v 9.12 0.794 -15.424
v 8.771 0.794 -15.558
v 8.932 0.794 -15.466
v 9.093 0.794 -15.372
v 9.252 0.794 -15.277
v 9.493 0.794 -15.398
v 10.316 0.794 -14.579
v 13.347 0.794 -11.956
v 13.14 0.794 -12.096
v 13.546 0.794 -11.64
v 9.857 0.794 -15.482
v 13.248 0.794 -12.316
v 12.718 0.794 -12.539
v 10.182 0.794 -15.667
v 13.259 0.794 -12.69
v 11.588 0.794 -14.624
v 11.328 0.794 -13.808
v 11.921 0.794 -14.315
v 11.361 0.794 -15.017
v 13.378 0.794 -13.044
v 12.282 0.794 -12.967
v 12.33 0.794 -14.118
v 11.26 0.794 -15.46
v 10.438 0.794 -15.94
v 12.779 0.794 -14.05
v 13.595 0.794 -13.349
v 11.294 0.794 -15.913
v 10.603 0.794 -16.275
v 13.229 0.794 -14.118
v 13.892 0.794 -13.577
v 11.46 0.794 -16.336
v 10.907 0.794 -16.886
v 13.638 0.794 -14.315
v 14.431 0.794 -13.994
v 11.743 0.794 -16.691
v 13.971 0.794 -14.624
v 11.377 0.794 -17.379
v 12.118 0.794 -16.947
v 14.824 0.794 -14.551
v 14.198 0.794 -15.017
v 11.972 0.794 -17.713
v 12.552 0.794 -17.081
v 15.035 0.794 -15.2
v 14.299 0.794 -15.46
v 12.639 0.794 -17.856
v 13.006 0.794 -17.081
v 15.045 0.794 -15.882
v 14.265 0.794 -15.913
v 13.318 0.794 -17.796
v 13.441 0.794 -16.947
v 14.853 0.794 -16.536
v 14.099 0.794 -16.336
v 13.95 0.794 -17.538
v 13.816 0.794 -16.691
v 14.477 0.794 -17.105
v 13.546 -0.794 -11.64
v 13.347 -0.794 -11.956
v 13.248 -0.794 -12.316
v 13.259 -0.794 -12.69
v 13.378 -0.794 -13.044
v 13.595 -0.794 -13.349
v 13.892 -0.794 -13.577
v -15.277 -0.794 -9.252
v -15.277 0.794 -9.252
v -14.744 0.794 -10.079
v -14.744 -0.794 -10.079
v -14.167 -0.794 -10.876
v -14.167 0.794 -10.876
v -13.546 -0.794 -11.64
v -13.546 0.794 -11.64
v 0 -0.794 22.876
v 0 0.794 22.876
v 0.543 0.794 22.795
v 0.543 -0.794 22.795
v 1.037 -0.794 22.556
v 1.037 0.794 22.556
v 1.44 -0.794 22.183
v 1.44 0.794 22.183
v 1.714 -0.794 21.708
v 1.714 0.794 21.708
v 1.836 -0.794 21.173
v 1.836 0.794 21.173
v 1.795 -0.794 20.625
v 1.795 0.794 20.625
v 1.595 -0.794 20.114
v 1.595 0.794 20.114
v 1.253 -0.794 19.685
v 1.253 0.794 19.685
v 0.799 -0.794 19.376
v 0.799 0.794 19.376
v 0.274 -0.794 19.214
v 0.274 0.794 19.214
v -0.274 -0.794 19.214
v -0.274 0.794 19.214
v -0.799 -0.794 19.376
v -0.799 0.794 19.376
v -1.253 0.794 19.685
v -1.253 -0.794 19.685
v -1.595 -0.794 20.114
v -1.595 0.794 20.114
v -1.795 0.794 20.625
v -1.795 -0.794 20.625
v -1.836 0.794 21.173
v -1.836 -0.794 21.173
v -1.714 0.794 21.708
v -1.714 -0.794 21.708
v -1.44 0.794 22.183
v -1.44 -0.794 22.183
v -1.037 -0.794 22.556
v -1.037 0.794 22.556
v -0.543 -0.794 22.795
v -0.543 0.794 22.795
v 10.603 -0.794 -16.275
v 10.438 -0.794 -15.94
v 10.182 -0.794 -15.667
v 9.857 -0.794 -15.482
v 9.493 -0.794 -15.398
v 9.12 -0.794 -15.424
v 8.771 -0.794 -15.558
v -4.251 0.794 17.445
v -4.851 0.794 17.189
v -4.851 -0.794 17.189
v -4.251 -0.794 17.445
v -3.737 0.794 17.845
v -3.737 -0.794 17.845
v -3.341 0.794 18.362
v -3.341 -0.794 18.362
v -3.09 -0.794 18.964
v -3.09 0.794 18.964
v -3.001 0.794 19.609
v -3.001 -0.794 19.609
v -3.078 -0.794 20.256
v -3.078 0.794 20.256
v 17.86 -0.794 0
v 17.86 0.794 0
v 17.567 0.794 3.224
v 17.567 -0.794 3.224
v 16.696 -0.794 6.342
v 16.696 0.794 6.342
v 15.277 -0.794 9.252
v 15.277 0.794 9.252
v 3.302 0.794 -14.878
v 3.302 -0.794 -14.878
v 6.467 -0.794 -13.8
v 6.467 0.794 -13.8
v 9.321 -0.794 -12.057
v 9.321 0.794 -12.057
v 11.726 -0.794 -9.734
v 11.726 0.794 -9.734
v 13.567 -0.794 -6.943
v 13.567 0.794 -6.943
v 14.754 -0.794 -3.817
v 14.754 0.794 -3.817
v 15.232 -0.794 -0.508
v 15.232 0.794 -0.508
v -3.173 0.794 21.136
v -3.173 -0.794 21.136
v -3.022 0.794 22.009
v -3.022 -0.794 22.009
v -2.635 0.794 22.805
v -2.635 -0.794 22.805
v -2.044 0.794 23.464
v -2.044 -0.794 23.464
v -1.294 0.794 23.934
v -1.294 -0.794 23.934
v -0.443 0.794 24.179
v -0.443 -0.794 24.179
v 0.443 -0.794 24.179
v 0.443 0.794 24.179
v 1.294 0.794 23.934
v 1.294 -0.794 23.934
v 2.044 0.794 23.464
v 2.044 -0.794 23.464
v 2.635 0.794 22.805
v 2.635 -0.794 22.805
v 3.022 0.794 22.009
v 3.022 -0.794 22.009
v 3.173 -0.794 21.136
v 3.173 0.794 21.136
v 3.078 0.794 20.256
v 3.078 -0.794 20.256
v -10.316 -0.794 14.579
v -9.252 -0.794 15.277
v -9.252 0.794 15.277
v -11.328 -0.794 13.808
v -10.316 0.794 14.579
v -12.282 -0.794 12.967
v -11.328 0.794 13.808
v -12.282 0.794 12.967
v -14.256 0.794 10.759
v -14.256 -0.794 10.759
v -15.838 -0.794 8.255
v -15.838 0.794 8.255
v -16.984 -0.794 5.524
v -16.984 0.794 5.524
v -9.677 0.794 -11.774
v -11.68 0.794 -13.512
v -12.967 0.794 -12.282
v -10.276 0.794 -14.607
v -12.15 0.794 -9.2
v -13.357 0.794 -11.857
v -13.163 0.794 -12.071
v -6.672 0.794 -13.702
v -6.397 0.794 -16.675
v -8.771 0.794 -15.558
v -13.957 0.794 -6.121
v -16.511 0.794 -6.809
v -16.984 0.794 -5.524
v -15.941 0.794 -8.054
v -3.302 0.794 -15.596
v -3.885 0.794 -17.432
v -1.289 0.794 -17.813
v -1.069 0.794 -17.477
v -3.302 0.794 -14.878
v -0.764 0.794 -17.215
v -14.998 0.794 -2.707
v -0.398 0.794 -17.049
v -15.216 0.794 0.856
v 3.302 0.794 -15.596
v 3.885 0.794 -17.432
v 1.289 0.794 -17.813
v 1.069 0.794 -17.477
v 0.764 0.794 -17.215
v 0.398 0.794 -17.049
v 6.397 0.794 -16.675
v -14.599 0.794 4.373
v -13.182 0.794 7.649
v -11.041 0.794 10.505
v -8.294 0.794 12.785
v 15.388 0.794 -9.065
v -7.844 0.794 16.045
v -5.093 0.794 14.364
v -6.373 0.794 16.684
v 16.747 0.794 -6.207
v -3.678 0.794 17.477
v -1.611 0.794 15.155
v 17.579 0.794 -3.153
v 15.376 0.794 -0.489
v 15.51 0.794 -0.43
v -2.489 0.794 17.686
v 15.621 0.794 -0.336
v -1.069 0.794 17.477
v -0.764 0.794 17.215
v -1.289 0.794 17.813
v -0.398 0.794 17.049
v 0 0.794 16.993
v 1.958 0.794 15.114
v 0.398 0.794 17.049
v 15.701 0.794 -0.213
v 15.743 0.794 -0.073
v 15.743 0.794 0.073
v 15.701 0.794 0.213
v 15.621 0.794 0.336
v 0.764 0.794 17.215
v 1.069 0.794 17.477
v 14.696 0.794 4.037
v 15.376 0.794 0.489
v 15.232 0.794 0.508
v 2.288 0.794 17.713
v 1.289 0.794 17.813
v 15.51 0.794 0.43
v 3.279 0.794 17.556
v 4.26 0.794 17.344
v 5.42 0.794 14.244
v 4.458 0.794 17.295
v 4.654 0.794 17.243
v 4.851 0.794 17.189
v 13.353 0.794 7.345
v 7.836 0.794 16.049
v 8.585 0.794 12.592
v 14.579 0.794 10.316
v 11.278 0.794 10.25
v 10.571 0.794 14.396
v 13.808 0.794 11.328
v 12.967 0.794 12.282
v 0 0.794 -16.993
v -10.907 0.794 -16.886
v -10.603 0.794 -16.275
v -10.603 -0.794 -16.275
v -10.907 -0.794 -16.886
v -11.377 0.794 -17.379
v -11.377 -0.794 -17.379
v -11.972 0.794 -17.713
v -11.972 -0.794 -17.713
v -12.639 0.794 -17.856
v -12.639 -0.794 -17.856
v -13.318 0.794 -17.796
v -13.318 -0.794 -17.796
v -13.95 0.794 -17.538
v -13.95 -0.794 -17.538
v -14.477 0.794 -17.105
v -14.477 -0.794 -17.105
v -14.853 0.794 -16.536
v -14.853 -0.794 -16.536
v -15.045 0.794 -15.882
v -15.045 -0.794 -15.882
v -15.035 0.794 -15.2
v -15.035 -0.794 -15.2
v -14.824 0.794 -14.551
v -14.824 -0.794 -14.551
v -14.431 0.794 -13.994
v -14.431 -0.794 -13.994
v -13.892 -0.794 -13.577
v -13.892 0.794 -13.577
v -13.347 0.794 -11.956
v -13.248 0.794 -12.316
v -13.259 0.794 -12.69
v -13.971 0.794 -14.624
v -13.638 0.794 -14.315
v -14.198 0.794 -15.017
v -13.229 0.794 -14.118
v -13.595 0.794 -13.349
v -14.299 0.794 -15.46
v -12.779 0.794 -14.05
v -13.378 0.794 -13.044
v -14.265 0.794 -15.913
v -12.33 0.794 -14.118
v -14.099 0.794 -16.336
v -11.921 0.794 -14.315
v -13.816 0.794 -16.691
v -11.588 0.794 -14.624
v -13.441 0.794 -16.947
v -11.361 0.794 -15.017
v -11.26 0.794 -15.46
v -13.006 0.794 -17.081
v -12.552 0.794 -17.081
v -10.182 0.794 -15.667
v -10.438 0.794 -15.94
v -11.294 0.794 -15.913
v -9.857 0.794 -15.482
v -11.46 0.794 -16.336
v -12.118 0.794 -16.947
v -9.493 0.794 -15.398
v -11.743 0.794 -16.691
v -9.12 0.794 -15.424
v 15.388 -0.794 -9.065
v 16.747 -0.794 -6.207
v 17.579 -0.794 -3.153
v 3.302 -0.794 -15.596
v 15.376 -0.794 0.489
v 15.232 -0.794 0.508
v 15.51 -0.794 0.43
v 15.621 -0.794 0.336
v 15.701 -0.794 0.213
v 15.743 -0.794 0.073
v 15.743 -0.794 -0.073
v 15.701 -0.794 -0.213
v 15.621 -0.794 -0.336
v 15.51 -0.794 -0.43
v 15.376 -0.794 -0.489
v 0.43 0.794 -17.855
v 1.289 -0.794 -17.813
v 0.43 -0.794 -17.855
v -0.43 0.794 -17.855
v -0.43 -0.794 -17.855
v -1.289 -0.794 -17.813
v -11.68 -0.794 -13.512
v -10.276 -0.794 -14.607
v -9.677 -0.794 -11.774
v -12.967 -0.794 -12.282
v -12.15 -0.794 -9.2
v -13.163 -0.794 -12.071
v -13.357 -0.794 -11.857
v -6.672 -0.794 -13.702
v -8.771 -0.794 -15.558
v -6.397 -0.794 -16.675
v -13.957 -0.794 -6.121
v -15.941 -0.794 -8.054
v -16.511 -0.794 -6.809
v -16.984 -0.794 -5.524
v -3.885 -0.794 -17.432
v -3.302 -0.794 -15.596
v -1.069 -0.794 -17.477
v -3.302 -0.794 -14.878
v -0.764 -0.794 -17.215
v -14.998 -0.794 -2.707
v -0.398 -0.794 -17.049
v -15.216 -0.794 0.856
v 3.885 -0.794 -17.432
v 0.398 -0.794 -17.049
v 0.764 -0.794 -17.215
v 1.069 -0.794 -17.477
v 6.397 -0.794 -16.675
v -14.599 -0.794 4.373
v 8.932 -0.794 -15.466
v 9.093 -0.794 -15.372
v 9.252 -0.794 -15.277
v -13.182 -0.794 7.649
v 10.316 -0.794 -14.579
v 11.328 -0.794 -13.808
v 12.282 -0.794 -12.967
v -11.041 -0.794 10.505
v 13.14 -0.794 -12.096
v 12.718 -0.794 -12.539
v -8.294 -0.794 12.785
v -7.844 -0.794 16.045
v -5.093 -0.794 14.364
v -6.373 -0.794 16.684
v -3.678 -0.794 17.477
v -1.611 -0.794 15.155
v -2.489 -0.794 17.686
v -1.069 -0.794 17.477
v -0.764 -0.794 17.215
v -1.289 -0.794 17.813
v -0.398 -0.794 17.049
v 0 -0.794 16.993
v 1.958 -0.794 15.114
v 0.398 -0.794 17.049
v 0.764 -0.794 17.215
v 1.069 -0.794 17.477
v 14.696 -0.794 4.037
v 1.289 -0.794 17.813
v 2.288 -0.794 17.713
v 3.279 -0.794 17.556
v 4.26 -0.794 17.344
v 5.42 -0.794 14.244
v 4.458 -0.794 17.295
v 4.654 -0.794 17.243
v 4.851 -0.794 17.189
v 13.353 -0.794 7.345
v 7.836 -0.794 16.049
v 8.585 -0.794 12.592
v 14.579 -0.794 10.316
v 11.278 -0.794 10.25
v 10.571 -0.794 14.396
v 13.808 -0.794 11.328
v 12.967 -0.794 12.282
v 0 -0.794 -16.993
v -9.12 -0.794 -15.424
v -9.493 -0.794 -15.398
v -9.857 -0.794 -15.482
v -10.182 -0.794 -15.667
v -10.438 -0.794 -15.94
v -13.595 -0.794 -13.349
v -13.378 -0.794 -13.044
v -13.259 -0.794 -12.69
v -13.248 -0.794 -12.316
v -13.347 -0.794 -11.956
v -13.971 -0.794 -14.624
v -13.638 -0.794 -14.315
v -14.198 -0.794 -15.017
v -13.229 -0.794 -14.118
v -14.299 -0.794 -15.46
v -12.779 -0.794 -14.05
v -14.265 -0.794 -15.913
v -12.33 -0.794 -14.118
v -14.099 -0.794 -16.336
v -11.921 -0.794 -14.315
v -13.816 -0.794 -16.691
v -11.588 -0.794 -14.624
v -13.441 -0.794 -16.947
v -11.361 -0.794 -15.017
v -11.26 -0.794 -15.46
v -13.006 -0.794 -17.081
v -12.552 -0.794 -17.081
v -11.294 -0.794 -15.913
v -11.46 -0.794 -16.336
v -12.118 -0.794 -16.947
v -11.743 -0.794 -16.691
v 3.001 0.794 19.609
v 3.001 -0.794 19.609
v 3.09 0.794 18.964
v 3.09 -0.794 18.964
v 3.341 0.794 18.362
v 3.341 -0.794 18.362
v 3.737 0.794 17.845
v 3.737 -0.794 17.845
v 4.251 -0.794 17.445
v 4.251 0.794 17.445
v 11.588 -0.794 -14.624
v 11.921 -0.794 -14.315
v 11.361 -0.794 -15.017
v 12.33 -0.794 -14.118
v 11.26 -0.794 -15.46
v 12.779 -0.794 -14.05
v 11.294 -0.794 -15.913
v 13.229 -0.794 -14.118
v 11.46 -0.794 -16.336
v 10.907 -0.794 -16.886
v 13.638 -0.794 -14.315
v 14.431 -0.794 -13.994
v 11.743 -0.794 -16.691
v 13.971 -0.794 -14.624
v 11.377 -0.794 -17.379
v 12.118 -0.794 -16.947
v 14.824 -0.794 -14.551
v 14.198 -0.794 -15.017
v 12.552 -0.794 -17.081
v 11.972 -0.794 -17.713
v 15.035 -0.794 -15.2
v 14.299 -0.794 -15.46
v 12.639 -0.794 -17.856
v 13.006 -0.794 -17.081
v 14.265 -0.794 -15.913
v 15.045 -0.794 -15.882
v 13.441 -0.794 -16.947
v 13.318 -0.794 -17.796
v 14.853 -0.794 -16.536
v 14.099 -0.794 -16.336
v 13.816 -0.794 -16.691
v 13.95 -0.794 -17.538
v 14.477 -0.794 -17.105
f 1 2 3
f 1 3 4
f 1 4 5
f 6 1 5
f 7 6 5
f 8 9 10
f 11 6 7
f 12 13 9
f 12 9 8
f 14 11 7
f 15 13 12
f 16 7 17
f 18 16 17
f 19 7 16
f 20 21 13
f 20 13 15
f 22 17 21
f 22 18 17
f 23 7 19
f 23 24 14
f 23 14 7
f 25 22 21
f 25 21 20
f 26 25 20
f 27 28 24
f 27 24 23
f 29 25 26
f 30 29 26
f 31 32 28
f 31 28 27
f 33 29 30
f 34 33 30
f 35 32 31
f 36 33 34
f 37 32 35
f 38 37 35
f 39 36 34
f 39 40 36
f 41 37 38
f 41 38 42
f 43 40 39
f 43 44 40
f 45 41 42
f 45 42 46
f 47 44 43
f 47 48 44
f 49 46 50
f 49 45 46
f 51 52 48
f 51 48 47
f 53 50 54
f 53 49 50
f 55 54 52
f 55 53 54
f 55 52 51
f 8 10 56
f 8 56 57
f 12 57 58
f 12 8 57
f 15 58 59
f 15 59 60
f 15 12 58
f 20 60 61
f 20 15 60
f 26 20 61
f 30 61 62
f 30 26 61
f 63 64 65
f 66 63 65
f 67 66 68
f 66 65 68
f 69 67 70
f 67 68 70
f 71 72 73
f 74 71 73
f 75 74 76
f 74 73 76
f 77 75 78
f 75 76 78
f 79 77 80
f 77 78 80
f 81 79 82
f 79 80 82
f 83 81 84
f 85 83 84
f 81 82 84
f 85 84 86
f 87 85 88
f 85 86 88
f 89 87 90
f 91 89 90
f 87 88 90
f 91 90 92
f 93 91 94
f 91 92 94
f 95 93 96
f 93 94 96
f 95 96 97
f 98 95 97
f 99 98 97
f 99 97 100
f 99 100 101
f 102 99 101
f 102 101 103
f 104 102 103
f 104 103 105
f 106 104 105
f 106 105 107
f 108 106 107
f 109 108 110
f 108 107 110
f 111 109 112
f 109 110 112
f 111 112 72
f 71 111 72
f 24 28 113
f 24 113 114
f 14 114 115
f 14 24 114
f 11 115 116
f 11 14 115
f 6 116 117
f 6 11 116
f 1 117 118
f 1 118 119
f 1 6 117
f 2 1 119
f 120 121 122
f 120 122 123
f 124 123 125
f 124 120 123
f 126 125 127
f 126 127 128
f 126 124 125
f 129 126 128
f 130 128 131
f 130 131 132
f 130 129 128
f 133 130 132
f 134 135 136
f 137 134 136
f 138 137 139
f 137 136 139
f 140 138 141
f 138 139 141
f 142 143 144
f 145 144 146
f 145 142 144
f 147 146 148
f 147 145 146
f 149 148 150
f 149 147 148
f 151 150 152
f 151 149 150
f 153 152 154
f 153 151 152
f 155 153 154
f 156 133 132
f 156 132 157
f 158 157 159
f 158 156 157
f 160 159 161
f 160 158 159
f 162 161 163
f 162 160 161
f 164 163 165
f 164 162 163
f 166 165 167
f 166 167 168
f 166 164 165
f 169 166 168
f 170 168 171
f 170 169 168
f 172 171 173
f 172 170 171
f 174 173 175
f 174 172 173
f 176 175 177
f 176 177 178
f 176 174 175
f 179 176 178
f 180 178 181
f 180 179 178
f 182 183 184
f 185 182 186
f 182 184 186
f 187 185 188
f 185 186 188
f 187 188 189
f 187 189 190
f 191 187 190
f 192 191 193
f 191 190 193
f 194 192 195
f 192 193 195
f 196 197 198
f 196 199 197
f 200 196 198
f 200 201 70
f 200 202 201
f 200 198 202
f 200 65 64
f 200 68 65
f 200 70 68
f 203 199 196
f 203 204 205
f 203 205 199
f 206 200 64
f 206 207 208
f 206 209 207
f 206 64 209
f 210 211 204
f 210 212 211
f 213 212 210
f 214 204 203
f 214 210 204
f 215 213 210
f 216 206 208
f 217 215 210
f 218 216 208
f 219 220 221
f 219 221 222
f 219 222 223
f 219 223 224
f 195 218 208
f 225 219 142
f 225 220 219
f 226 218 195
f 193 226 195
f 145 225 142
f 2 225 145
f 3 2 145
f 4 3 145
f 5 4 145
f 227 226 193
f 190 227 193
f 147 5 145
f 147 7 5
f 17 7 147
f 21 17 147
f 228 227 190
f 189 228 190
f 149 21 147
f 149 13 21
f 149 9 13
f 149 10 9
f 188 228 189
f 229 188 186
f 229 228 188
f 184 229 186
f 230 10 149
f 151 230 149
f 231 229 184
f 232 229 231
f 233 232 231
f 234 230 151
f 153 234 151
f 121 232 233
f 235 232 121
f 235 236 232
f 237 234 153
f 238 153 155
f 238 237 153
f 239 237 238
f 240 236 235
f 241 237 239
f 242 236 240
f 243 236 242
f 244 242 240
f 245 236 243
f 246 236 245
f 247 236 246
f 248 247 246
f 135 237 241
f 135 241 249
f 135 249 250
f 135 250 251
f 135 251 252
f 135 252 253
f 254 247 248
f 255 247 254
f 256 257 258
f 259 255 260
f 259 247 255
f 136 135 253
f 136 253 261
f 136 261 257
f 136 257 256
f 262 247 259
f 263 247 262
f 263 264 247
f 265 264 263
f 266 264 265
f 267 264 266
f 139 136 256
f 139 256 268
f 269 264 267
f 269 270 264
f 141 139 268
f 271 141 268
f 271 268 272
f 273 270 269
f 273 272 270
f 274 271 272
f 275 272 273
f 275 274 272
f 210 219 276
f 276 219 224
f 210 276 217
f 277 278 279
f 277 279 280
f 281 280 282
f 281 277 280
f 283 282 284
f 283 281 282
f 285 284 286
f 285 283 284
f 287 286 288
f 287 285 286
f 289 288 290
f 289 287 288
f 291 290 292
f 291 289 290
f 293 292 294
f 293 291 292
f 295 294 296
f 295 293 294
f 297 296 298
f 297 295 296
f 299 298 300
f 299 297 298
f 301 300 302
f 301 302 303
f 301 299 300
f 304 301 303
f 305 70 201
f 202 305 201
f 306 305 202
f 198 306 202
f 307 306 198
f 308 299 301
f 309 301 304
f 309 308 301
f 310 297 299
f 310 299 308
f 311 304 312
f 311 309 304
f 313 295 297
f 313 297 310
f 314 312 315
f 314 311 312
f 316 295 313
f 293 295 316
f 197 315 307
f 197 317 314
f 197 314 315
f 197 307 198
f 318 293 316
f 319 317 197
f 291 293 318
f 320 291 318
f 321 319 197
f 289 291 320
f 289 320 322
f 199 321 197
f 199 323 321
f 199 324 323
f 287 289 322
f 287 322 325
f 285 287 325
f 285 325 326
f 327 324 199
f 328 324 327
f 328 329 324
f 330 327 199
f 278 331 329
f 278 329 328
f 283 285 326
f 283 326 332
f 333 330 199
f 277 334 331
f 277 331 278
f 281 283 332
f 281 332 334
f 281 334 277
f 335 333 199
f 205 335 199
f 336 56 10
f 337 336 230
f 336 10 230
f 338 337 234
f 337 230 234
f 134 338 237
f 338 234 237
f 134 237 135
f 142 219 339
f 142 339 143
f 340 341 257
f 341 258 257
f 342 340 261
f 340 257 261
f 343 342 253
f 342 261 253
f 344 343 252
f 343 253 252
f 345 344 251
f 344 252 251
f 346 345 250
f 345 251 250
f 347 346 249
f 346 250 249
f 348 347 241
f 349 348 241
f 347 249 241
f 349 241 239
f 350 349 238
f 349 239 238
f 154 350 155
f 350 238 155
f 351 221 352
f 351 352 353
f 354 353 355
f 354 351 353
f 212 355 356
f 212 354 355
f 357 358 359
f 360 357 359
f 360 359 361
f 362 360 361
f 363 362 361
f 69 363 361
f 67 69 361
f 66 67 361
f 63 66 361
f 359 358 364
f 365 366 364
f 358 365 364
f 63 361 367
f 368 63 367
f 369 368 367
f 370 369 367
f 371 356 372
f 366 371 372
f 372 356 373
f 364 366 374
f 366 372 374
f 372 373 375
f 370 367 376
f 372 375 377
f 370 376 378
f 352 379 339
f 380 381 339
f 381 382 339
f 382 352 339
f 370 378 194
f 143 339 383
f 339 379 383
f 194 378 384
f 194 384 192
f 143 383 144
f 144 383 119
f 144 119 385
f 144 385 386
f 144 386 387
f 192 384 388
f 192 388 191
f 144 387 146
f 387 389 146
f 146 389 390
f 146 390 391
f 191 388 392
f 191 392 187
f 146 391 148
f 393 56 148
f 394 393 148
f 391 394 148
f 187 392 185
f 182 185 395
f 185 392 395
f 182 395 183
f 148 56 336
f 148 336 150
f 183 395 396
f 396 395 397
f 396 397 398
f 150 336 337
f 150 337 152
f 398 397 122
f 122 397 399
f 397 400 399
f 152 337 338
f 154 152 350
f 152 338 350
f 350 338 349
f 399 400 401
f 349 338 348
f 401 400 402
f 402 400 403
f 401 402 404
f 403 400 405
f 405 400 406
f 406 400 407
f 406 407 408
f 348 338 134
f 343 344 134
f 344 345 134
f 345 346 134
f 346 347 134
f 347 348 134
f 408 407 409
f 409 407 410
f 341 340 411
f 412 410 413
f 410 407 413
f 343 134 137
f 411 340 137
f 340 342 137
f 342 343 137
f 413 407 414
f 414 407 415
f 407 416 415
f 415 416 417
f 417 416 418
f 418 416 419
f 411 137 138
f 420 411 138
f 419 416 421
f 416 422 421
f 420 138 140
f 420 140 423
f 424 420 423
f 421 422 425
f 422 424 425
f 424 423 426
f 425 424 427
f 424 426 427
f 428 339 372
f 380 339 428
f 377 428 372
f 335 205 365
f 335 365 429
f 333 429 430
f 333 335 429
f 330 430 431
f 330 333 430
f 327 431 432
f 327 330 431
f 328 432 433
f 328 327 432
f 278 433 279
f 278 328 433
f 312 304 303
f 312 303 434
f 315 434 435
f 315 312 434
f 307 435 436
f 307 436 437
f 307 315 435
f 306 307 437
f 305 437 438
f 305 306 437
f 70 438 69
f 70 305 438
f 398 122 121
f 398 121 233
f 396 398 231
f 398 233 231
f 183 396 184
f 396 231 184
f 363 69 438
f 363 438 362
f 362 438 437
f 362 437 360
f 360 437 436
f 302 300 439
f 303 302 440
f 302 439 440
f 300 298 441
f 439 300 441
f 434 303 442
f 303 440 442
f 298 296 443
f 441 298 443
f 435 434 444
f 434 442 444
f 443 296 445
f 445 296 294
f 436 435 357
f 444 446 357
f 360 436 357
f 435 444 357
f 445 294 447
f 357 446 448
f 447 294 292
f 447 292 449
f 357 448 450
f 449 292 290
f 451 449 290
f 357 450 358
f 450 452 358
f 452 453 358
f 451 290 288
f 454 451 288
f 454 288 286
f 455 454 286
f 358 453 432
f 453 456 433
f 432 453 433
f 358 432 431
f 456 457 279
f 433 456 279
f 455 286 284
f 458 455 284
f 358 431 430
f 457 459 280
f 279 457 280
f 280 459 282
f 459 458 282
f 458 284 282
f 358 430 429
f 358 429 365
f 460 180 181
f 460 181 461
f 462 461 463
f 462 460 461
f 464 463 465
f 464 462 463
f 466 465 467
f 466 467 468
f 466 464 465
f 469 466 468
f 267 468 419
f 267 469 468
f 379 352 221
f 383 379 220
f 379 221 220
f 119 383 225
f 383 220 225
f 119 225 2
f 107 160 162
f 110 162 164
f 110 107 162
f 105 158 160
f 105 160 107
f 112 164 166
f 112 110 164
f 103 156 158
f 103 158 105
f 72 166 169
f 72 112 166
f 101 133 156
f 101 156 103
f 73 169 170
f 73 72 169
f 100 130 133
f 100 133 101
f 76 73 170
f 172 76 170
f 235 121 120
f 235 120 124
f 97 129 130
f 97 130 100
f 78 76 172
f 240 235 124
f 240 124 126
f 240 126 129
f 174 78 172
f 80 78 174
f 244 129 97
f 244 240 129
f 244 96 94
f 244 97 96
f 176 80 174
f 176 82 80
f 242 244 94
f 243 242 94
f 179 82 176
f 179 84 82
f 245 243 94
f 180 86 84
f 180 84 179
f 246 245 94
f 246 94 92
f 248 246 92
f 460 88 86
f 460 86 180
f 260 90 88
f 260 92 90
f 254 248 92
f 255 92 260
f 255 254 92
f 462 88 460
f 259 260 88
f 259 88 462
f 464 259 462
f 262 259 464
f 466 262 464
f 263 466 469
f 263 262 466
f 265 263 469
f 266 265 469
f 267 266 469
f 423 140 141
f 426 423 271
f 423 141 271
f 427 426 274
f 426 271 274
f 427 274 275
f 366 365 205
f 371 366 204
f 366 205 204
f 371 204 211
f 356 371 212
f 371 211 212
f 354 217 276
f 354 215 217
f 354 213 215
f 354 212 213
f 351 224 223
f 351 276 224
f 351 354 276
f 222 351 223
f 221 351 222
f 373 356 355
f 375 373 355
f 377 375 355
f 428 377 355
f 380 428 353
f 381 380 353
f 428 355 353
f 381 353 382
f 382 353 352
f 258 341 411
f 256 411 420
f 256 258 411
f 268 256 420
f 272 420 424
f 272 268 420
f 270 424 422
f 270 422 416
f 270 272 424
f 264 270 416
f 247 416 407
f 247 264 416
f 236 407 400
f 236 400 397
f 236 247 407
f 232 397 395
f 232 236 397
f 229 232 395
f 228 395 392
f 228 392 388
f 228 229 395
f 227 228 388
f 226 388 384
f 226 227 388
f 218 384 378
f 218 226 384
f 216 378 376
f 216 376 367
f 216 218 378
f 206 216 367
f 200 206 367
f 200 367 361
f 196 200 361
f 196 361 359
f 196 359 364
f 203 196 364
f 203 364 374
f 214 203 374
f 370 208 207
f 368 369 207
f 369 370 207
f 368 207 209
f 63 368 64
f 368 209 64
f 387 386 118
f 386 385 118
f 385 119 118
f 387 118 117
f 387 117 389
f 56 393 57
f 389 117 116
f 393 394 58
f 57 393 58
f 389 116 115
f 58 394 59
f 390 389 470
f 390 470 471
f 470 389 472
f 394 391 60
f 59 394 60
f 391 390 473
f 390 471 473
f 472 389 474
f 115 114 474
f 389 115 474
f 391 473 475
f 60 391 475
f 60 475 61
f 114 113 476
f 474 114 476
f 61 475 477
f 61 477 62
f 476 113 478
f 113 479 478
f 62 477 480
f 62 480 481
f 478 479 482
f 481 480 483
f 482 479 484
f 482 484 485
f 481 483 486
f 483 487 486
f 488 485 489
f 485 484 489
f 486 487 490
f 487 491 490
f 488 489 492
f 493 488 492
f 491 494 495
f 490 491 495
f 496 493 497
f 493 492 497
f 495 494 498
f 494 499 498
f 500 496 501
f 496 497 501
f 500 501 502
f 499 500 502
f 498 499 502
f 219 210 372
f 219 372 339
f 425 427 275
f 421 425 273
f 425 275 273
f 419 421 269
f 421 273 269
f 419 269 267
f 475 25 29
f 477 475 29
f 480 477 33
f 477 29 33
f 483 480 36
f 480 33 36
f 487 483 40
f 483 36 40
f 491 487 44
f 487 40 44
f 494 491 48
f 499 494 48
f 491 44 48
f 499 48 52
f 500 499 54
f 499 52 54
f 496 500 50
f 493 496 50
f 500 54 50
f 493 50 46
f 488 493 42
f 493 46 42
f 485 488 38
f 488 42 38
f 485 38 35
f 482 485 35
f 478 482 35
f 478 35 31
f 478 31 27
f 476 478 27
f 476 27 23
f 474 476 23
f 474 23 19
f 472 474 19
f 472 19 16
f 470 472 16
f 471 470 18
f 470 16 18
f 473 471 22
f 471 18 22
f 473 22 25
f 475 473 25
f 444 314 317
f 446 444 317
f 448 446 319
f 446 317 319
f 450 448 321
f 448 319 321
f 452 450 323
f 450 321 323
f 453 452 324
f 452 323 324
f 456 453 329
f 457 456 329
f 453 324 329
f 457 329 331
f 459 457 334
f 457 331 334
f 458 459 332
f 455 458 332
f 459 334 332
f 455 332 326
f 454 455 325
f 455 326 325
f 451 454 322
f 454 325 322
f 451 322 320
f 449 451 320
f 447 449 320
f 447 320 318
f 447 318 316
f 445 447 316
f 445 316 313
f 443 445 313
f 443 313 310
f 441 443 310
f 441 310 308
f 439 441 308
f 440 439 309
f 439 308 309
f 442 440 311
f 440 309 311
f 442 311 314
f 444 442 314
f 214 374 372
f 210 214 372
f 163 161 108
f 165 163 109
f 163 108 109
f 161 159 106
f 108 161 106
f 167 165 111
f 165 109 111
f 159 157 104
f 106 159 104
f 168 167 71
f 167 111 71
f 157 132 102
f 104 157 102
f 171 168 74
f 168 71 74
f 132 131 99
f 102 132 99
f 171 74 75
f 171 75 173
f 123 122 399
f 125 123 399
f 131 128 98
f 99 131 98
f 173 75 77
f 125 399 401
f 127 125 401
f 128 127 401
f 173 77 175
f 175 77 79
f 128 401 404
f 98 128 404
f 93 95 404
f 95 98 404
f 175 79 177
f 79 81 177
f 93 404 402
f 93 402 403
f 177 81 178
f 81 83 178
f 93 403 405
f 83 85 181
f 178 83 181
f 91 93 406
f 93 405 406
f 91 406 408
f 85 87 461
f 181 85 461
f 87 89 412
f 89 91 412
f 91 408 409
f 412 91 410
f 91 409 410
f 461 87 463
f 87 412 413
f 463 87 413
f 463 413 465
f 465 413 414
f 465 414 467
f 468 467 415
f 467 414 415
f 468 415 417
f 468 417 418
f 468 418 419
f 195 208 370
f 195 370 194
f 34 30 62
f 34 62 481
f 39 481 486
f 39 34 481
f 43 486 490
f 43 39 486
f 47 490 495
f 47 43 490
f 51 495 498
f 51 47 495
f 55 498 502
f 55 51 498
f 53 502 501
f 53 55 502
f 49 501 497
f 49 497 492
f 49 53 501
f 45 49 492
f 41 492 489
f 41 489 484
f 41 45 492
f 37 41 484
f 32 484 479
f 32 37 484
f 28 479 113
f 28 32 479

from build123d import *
from build123d.topology import SkipClean

# Parameters (mm, degrees)
SKETCH1_R           = 21.59
BOSS_EXTRUDE1_DEPTH = 0.79375
SKETCH2_R           = 1.4224
CUT_EXTRUDE1_DEPTH  = 31.574112518
CUT_EXTRUDE2_DEPTH  = 31.574112518
SKETCH4_R           = 0.508
CUT_EXTRUDE3_DEPTH  = 31.574112518
SKETCH5_R           = 1.0922
CUT_EXTRUDE4_DEPTH  = 31.574112518
SKETCH6_R           = 1.524
SKETCH6_R_2         = 1.8415
BOSS_EXTRUDE2_DEPTH = 1.5875


with BuildPart() as part:
    # Sketch1 → Boss-Extrude1 (new, symmetric)
    with BuildSketch(Plane(origin=(0, 0, 0), x_dir=(1, 0, 0), z_dir=(0, 1, 0))):
        with Locations(Location((0, 0, 0), (0, 0, 270))):
            Circle(SKETCH1_R)
        with BuildLine():
            Line((-3.302, 14.8779836), (-3.302, 15.5956))
            Line((-3.302, 15.5956), (3.302, 15.5956))
            Line((3.302, 15.5956), (3.302, 14.8779836))
            ThreePointArc((3.302, 14.8779836), (11.8865487, 9.537691545), (15.24, 0))
            ThreePointArc((15.24, 0), (-9.537691545, -11.8865487), (-3.302, 14.8779836))
        make_face(mode=Mode.SUBTRACT)
    extrude(amount=BOSS_EXTRUDE1_DEPTH, both=True)

    # Sketch2 → Cut-Extrude1 (cut, through all)
    with BuildSketch(Plane(origin=(0, 0.79375, 0), x_dir=(1, 0, 0), z_dir=(0, 1, 0))):
        with Locations(Location((0, 18.415, 0), (0, 0, 270))):
            Circle(SKETCH2_R)
        with Locations(Location((0, -18.415, 0), (0, 0, 270))):
            Circle(SKETCH2_R)
    extrude(amount=-CUT_EXTRUDE1_DEPTH, mode=Mode.SUBTRACT)

    # Sketch3 → Cut-Extrude2 (cut, through all)
    with BuildSketch(Plane(origin=(0, 0.79375, 0), x_dir=(1, 0, 0), z_dir=(0, 1, 0))):
        with BuildLine():
            Line((-20.871224203, 5.5245), (-16.984058744, 5.5245))
            Line((-16.984058744, 5.5245), (-16.984058744, -5.5245))
            Line((-16.984058744, -5.5245), (-20.871224203, -5.5245))
            ThreePointArc((-20.871224203, -5.5245), (-21.59, 0), (-20.871224203, 5.5245))
        make_face()
    extrude(amount=-CUT_EXTRUDE2_DEPTH, mode=Mode.SUBTRACT)

    # Sketch4 → Cut-Extrude3 (cut, through all)
    with BuildSketch(Plane(origin=(0, 0.79375, 0), x_dir=(1, 0, 0), z_dir=(0, 1, 0))):
        with Locations((15.24, 0)):
            Circle(SKETCH4_R)
    extrude(amount=-CUT_EXTRUDE3_DEPTH, mode=Mode.SUBTRACT)

    # Sketch5 → Cut-Extrude4 (cut, through all)
    # profile 1 of 16: a face of its own
    with BuildSketch(Plane(origin=(0, 0.79375, 0), x_dir=(1, 0, 0), z_dir=(0, 1, 0))):
        with BuildLine():
            ThreePointArc((-16.984058744, 5.5245), (-16.237733521, 7.437362555), (-15.276788696, 9.25192298))
            Line((-15.276788696, 9.25192298), (-17.314108781, 10.80523309))
            ThreePointArc((-17.314108781, 10.80523309), (-17.76113274, 11.28937197), (-18.016469323, 11.896845513))
            ThreePointArc((-18.016469323, 11.896845513), (-19.70316913, 8.826846902), (-20.871224203, 5.5245))
            Line((-20.871224203, 5.5245), (-16.984058744, 5.5245))
        make_face()
    # profile 2 of 16: a face of its own
    with BuildSketch(Plane(origin=(0, 0.79375, 0), x_dir=(1, 0, 0), z_dir=(0, 1, 0))):
        with BuildLine():
            Line((-17.314108781, 10.80523309), (-15.276788696, 9.25192298))
            ThreePointArc((-15.276788696, 9.25192298), (-14.202798716, 10.828613037), (-12.966760902, 12.28175327))
            Line((-12.966760902, 12.28175327), (-15.004080987, 13.83506338))
            ThreePointArc((-15.004080987, 13.83506338), (-15.589304916, 14.13793931), (-16.242705475, 14.223312513))
            ThreePointArc((-16.242705475, 14.223312513), (-17.169038314, 13.0901575), (-18.016469323, 11.896845513))
            ThreePointArc((-18.016469323, 11.896845513), (-17.76113274, 11.28937197), (-17.314108781, 10.80523309))
        make_face()
        with Locations((-16.159094884, 12.320148235)):
            Circle(SKETCH5_R, mode=Mode.SUBTRACT)
    # profile 3 of 16: a face of its own
    with BuildSketch(Plane(origin=(0, 0.79375, 0), x_dir=(1, 0, 0), z_dir=(0, 1, 0))):
        with Locations((-16.159094884, 12.320148235)):
            Circle(SKETCH5_R)
    # profile 4 of 16: a face of its own
    with BuildSketch(Plane(origin=(0, 0.79375, 0), x_dir=(1, 0, 0), z_dir=(0, 1, 0))):
        with BuildLine():
            Line((-15.004080987, 13.83506338), (-12.966760902, 12.28175327))
            ThreePointArc((-12.966760902, 12.28175327), (-7.645640437, 16.140710455), (-1.288911844, 17.813395463))
            ThreePointArc((-1.288911844, 17.813395463), (-0.308118121, 19.803627014), (1.4224, 18.415))
            ThreePointArc((1.4224, 18.415), (1.388627014, 18.106881879), (1.288911844, 17.813395463))
            ThreePointArc((1.288911844, 17.813395463), (5.420875683, 17.017416329), (9.25192298, 15.276788696))
            Line((9.25192298, 15.276788696), (10.80523309, 17.314108781))
            ThreePointArc((10.80523309, 17.314108781), (11.28937197, 17.76113274), (11.896845513, 18.016469323))
            ThreePointArc((11.896845513, 18.016469323), (-2.884204284, 21.396482553), (-16.242705475, 14.223312513))
            ThreePointArc((-16.242705475, 14.223312513), (-15.589304916, 14.13793931), (-15.004080987, 13.83506338))
        make_face()
    # profile 5 of 16: a face of its own
    with BuildSketch(Plane(origin=(0, 0.79375, 0), x_dir=(1, 0, 0), z_dir=(0, 1, 0))):
        with BuildLine():
            Line((10.80523309, 17.314108781), (9.25192298, 15.276788696))
            ThreePointArc((9.25192298, 15.276788696), (10.828613037, 14.202798716), (12.28175327, 12.966760902))
            Line((12.28175327, 12.966760902), (13.83506338, 15.004080987))
            ThreePointArc((13.83506338, 15.004080987), (14.13793931, 15.589304916), (14.223312513, 16.242705475))
            ThreePointArc((14.223312513, 16.242705475), (13.0901575, 17.169038314), (11.896845513, 18.016469323))
            ThreePointArc((11.896845513, 18.016469323), (11.28937197, 17.76113274), (10.80523309, 17.314108781))
        make_face()
        with Locations((12.320148235, 16.159094884)):
            Circle(SKETCH5_R, mode=Mode.SUBTRACT)
    # profile 6 of 16: a face of its own
    with BuildSketch(Plane(origin=(0, 0.79375, 0), x_dir=(1, 0, 0), z_dir=(0, 1, 0))):
        with Locations((12.320148235, 16.159094884)):
            Circle(SKETCH5_R)
    # profile 7 of 16: a face of its own
    with BuildSketch(Plane(origin=(0, 0.79375, 0), x_dir=(1, 0, 0), z_dir=(0, 1, 0))):
        with BuildLine():
            Line((13.83506338, 15.004080987), (12.28175327, 12.966760902))
            ThreePointArc((12.28175327, 12.966760902), (16.406249356, 7.057856172), (17.859965052, 0))
            ThreePointArc((17.859965052, 0), (17.202053132, -4.802886604), (15.276788696, -9.25192298))
            Line((15.276788696, -9.25192298), (17.314108781, -10.80523309))
            ThreePointArc((17.314108781, -10.80523309), (17.76113274, -11.28937197), (18.016469323, -11.896845513))
            ThreePointArc((18.016469323, -11.896845513), (21.396482553, 2.884204284), (14.223312513, 16.242705475))
            ThreePointArc((14.223312513, 16.242705475), (14.13793931, 15.589304916), (13.83506338, 15.004080987))
        make_face()
    # profile 8 of 16: a face of its own
    with BuildSketch(Plane(origin=(0, 0.79375, 0), x_dir=(1, 0, 0), z_dir=(0, 1, 0))):
        with BuildLine():
            ThreePointArc((4.602470139, -19.883377319), (4.576225926, -20.541808877), (4.327227494, -21.151907768))
            ThreePointArc((4.327227494, -21.151907768), (10.852736689, -18.664035104), (16.242705475, -14.223312513))
            ThreePointArc((16.242705475, -14.223312513), (15.589304916, -14.13793931), (15.004080987, -13.83506338))
            Line((15.004080987, -13.83506338), (12.966760902, -12.28175327))
            ThreePointArc((12.966760902, -12.28175327), (8.977744233, -15.439509712), (4.260223404, -17.344418359))
            Line((4.260223404, -17.344418359), (4.602470139, -19.883377319))
        make_face()
    # profile 9 of 16: a face of its own
    with BuildSketch(Plane(origin=(0, 0.79375, 0), x_dir=(1, 0, 0), z_dir=(0, 1, 0))):
        with BuildLine():
            ThreePointArc((15.004080987, -13.83506338), (15.589304916, -14.13793931), (16.242705475, -14.223312513))
            ThreePointArc((16.242705475, -14.223312513), (17.169038314, -13.0901575), (18.016469323, -11.896845513))
            ThreePointArc((18.016469323, -11.896845513), (17.76113274, -11.28937197), (17.314108781, -10.80523309))
            Line((17.314108781, -10.80523309), (15.276788696, -9.25192298))
            ThreePointArc((15.276788696, -9.25192298), (14.202798716, -10.828613037), (12.966760902, -12.28175327))
            Line((12.966760902, -12.28175327), (15.004080987, -13.83506338))
        make_face()
        with Locations((16.159094884, -12.320148235)):
            Circle(SKETCH5_R, mode=Mode.SUBTRACT)
    # profile 10 of 16: a face of its own
    with BuildSketch(Plane(origin=(0, 0.79375, 0), x_dir=(1, 0, 0), z_dir=(0, 1, 0))):
        with Locations((16.159094884, -12.320148235)):
            Circle(SKETCH5_R)
    # profile 11 of 16: a face of its own
    with BuildSketch(Plane(origin=(0, 0.79375, 0), x_dir=(1, 0, 0), z_dir=(0, 1, 0))):
        with BuildLine():
            ThreePointArc((0.826620277, -20.392354546), (1.026270462, -21.020335978), (1.427926458, -21.542727915))
            ThreePointArc((1.427926458, -21.542727915), (2.884204284, -21.396482553), (4.327227494, -21.151907768))
            ThreePointArc((4.327227494, -21.151907768), (4.576225926, -20.541808877), (4.602470139, -19.883377319))
            Line((4.602470139, -19.883377319), (4.260223404, -17.344418359))
            ThreePointArc((4.260223404, -17.344418359), (2.784458723, -17.64157423), (1.288911844, -17.813395463))
            ThreePointArc((1.288911844, -17.813395463), (1.388627014, -18.106881879), (1.4224, -18.415))
            ThreePointArc((1.4224, -18.415), (1.235821862, -19.119248596), (0.725034865, -19.638742704))
            Line((0.725034865, -19.638742704), (0.826620277, -20.392354546))
        make_face()
        with Locations((2.714545208, -20.137865932)):
            Circle(SKETCH5_R, mode=Mode.SUBTRACT)
    # profile 12 of 16: a face of its own
    with BuildSketch(Plane(origin=(0, 0.79375, 0), x_dir=(1, 0, 0), z_dir=(0, 1, 0))):
        with Locations((2.714545208, -20.137865932)):
            Circle(SKETCH5_R)
    # profile 13 of 16: a face of its own
    with BuildSketch(Plane(origin=(0, 0.79375, 0), x_dir=(1, 0, 0), z_dir=(0, 1, 0))):
        with BuildLine():
            ThreePointArc((-1.288911844, -17.813395463), (-5.420875683, -17.017416329), (-9.25192298, -15.276788696))
            Line((-9.25192298, -15.276788696), (-10.80523309, -17.314108781))
            ThreePointArc((-10.80523309, -17.314108781), (-11.28937197, -17.76113274), (-11.896845513, -18.016469323))
            ThreePointArc((-11.896845513, -18.016469323), (-5.523422079, -20.871509494), (1.427926458, -21.542727915))
            ThreePointArc((1.427926458, -21.542727915), (1.026270462, -21.020335978), (0.826620277, -20.392354546))
            Line((0.826620277, -20.392354546), (0.725034865, -19.638742704))
            ThreePointArc((0.725034865, -19.638742704), (-0.955229003, -19.468925667), (-1.288911844, -17.813395463))
        make_face()
    # profile 14 of 16: a face of its own
    with BuildSketch(Plane(origin=(0, 0.79375, 0), x_dir=(1, 0, 0), z_dir=(0, 1, 0))):
        with BuildLine():
            ThreePointArc((-14.223312513, -16.242705475), (-14.13793931, -15.589304916), (-13.83506338, -15.004080987))
            Line((-13.83506338, -15.004080987), (-12.28175327, -12.966760902))
            ThreePointArc((-12.28175327, -12.966760902), (-15.098634046, -9.539895263), (-16.984058744, -5.5245))
            Line((-16.984058744, -5.5245), (-20.871224203, -5.5245))
            ThreePointArc((-20.871224203, -5.5245), (-18.34738698, -11.379872188), (-14.223312513, -16.242705475))
        make_face()
    # profile 15 of 16: a face of its own
    with BuildSketch(Plane(origin=(0, 0.79375, 0), x_dir=(1, 0, 0), z_dir=(0, 1, 0))):
        with BuildLine():
            Line((-12.28175327, -12.966760902), (-13.83506338, -15.004080987))
            ThreePointArc((-13.83506338, -15.004080987), (-14.13793931, -15.589304916), (-14.223312513, -16.242705475))
            ThreePointArc((-14.223312513, -16.242705475), (-13.0901575, -17.169038314), (-11.896845513, -18.016469323))
            ThreePointArc((-11.896845513, -18.016469323), (-11.28937197, -17.76113274), (-10.80523309, -17.314108781))
            Line((-10.80523309, -17.314108781), (-9.25192298, -15.276788696))
            ThreePointArc((-9.25192298, -15.276788696), (-10.828613037, -14.202798716), (-12.28175327, -12.966760902))
        make_face()
        with Locations((-12.320148235, -16.159094884)):
            Circle(SKETCH5_R, mode=Mode.SUBTRACT)
    # profile 16 of 16: a face of its own
    with BuildSketch(Plane(origin=(0, 0.79375, 0), x_dir=(1, 0, 0), z_dir=(0, 1, 0))):
        with Locations((-12.320148235, -16.159094884)):
            Circle(SKETCH5_R)
    extrude(amount=-CUT_EXTRUDE4_DEPTH, mode=Mode.SUBTRACT)

    # Sketch6 → Boss-Extrude2 (add)
    # profile 1 of 4: a face of its own
    with SkipClean():  # the faces are left unmerged after this step: merging them gives an invalid solid
        with BuildSketch(Plane(origin=(0, 0.79375, 0), x_dir=(1, 0, 0), z_dir=(0, 1, 0))):
            with BuildLine():
                ThreePointArc((-1.288911844, 17.813395463), (0, 16.9926), (1.288911844, 17.813395463))
                ThreePointArc((1.288911844, 17.813395463), (0, 17.859965052), (-1.288911844, 17.813395463))
            make_face()
        # profile 2 of 4: a face of its own
        with BuildSketch(Plane(origin=(0, 0.79375, 0), x_dir=(1, 0, 0), z_dir=(0, 1, 0))):
            with BuildLine():
                ThreePointArc((10.603438462, 16.274857531), (9.857305852, 15.481530327), (8.7709155, 15.557936655))
                ThreePointArc((8.7709155, 15.557936655), (11.329244242, 13.806758366), (13.546192537, 11.639545499))
                ThreePointArc((13.546192537, 11.639545499), (13.259158239, 12.690113464), (13.891550345, 13.57677121))
                ThreePointArc((13.891550345, 13.57677121), (14.229435023, 17.341171675), (10.603438462, 16.274857531))
            make_face()
            with Locations(Location((12.779339593, 15.573965052, 0), (0, 0, 270))):
                Circle(SKETCH6_R, mode=Mode.SUBTRACT)
        # profile 3 of 4: a face of its own
        with BuildSketch(Plane(origin=(0, 0.79375, 0), x_dir=(1, 0, 0), z_dir=(0, 1, 0))):
            with BuildLine():
                ThreePointArc((-8.770915597, 15.5579366), (-9.857305886, 15.48153034), (-10.60343845, 16.274857493))
                ThreePointArc((-10.60343845, 16.274857493), (-14.229434867, 17.341171803), (-13.891550662, 13.576771387))
                ThreePointArc((-13.891550662, 13.576771387), (-13.259158273, 12.690113657), (-13.546192517, 11.639545523))
                ThreePointArc((-13.546192517, 11.639545523), (-11.329244273, 13.806758341), (-8.770915597, 15.5579366))
            make_face()
            with Locations(Location((-12.779339593, 15.573965052, 0), (0, 0, 270))):
                Circle(SKETCH6_R, mode=Mode.SUBTRACT)
        # profile 4 of 4: a face of its own
        with BuildSketch(Plane(origin=(0, 0.79375, 0), x_dir=(1, 0, 0), z_dir=(0, 1, 0))):
            with BuildLine():
                ThreePointArc((3.078011458, -20.256202915), (3.341190791, -18.362372667), (4.850583348, -17.188664662))
                ThreePointArc((4.850583348, -17.188664662), (3.085599204, -17.591402139), (1.288911844, -17.813395463))
                ThreePointArc((1.288911844, -17.813395463), (0, -16.9926), (-1.288911844, -17.813395463))
                ThreePointArc((-1.288911844, -17.813395463), (-3.08559897, -17.59140218), (-4.85058289, -17.188664791))
                ThreePointArc((-4.85058289, -17.188664791), (-3.34119067, -18.362372877), (-3.07801146, -20.256202925))
                ThreePointArc((-3.07801146, -20.256202925), (5e-09, -24.209965052), (3.078011458, -20.256202915))
            make_face()
            with Locations(Location((0, -21.034965052, 0), (0, 0, 270))):
                Circle(SKETCH6_R_2, mode=Mode.SUBTRACT)
        extrude(amount=-BOSS_EXTRUDE2_DEPTH)


solid = part.part
